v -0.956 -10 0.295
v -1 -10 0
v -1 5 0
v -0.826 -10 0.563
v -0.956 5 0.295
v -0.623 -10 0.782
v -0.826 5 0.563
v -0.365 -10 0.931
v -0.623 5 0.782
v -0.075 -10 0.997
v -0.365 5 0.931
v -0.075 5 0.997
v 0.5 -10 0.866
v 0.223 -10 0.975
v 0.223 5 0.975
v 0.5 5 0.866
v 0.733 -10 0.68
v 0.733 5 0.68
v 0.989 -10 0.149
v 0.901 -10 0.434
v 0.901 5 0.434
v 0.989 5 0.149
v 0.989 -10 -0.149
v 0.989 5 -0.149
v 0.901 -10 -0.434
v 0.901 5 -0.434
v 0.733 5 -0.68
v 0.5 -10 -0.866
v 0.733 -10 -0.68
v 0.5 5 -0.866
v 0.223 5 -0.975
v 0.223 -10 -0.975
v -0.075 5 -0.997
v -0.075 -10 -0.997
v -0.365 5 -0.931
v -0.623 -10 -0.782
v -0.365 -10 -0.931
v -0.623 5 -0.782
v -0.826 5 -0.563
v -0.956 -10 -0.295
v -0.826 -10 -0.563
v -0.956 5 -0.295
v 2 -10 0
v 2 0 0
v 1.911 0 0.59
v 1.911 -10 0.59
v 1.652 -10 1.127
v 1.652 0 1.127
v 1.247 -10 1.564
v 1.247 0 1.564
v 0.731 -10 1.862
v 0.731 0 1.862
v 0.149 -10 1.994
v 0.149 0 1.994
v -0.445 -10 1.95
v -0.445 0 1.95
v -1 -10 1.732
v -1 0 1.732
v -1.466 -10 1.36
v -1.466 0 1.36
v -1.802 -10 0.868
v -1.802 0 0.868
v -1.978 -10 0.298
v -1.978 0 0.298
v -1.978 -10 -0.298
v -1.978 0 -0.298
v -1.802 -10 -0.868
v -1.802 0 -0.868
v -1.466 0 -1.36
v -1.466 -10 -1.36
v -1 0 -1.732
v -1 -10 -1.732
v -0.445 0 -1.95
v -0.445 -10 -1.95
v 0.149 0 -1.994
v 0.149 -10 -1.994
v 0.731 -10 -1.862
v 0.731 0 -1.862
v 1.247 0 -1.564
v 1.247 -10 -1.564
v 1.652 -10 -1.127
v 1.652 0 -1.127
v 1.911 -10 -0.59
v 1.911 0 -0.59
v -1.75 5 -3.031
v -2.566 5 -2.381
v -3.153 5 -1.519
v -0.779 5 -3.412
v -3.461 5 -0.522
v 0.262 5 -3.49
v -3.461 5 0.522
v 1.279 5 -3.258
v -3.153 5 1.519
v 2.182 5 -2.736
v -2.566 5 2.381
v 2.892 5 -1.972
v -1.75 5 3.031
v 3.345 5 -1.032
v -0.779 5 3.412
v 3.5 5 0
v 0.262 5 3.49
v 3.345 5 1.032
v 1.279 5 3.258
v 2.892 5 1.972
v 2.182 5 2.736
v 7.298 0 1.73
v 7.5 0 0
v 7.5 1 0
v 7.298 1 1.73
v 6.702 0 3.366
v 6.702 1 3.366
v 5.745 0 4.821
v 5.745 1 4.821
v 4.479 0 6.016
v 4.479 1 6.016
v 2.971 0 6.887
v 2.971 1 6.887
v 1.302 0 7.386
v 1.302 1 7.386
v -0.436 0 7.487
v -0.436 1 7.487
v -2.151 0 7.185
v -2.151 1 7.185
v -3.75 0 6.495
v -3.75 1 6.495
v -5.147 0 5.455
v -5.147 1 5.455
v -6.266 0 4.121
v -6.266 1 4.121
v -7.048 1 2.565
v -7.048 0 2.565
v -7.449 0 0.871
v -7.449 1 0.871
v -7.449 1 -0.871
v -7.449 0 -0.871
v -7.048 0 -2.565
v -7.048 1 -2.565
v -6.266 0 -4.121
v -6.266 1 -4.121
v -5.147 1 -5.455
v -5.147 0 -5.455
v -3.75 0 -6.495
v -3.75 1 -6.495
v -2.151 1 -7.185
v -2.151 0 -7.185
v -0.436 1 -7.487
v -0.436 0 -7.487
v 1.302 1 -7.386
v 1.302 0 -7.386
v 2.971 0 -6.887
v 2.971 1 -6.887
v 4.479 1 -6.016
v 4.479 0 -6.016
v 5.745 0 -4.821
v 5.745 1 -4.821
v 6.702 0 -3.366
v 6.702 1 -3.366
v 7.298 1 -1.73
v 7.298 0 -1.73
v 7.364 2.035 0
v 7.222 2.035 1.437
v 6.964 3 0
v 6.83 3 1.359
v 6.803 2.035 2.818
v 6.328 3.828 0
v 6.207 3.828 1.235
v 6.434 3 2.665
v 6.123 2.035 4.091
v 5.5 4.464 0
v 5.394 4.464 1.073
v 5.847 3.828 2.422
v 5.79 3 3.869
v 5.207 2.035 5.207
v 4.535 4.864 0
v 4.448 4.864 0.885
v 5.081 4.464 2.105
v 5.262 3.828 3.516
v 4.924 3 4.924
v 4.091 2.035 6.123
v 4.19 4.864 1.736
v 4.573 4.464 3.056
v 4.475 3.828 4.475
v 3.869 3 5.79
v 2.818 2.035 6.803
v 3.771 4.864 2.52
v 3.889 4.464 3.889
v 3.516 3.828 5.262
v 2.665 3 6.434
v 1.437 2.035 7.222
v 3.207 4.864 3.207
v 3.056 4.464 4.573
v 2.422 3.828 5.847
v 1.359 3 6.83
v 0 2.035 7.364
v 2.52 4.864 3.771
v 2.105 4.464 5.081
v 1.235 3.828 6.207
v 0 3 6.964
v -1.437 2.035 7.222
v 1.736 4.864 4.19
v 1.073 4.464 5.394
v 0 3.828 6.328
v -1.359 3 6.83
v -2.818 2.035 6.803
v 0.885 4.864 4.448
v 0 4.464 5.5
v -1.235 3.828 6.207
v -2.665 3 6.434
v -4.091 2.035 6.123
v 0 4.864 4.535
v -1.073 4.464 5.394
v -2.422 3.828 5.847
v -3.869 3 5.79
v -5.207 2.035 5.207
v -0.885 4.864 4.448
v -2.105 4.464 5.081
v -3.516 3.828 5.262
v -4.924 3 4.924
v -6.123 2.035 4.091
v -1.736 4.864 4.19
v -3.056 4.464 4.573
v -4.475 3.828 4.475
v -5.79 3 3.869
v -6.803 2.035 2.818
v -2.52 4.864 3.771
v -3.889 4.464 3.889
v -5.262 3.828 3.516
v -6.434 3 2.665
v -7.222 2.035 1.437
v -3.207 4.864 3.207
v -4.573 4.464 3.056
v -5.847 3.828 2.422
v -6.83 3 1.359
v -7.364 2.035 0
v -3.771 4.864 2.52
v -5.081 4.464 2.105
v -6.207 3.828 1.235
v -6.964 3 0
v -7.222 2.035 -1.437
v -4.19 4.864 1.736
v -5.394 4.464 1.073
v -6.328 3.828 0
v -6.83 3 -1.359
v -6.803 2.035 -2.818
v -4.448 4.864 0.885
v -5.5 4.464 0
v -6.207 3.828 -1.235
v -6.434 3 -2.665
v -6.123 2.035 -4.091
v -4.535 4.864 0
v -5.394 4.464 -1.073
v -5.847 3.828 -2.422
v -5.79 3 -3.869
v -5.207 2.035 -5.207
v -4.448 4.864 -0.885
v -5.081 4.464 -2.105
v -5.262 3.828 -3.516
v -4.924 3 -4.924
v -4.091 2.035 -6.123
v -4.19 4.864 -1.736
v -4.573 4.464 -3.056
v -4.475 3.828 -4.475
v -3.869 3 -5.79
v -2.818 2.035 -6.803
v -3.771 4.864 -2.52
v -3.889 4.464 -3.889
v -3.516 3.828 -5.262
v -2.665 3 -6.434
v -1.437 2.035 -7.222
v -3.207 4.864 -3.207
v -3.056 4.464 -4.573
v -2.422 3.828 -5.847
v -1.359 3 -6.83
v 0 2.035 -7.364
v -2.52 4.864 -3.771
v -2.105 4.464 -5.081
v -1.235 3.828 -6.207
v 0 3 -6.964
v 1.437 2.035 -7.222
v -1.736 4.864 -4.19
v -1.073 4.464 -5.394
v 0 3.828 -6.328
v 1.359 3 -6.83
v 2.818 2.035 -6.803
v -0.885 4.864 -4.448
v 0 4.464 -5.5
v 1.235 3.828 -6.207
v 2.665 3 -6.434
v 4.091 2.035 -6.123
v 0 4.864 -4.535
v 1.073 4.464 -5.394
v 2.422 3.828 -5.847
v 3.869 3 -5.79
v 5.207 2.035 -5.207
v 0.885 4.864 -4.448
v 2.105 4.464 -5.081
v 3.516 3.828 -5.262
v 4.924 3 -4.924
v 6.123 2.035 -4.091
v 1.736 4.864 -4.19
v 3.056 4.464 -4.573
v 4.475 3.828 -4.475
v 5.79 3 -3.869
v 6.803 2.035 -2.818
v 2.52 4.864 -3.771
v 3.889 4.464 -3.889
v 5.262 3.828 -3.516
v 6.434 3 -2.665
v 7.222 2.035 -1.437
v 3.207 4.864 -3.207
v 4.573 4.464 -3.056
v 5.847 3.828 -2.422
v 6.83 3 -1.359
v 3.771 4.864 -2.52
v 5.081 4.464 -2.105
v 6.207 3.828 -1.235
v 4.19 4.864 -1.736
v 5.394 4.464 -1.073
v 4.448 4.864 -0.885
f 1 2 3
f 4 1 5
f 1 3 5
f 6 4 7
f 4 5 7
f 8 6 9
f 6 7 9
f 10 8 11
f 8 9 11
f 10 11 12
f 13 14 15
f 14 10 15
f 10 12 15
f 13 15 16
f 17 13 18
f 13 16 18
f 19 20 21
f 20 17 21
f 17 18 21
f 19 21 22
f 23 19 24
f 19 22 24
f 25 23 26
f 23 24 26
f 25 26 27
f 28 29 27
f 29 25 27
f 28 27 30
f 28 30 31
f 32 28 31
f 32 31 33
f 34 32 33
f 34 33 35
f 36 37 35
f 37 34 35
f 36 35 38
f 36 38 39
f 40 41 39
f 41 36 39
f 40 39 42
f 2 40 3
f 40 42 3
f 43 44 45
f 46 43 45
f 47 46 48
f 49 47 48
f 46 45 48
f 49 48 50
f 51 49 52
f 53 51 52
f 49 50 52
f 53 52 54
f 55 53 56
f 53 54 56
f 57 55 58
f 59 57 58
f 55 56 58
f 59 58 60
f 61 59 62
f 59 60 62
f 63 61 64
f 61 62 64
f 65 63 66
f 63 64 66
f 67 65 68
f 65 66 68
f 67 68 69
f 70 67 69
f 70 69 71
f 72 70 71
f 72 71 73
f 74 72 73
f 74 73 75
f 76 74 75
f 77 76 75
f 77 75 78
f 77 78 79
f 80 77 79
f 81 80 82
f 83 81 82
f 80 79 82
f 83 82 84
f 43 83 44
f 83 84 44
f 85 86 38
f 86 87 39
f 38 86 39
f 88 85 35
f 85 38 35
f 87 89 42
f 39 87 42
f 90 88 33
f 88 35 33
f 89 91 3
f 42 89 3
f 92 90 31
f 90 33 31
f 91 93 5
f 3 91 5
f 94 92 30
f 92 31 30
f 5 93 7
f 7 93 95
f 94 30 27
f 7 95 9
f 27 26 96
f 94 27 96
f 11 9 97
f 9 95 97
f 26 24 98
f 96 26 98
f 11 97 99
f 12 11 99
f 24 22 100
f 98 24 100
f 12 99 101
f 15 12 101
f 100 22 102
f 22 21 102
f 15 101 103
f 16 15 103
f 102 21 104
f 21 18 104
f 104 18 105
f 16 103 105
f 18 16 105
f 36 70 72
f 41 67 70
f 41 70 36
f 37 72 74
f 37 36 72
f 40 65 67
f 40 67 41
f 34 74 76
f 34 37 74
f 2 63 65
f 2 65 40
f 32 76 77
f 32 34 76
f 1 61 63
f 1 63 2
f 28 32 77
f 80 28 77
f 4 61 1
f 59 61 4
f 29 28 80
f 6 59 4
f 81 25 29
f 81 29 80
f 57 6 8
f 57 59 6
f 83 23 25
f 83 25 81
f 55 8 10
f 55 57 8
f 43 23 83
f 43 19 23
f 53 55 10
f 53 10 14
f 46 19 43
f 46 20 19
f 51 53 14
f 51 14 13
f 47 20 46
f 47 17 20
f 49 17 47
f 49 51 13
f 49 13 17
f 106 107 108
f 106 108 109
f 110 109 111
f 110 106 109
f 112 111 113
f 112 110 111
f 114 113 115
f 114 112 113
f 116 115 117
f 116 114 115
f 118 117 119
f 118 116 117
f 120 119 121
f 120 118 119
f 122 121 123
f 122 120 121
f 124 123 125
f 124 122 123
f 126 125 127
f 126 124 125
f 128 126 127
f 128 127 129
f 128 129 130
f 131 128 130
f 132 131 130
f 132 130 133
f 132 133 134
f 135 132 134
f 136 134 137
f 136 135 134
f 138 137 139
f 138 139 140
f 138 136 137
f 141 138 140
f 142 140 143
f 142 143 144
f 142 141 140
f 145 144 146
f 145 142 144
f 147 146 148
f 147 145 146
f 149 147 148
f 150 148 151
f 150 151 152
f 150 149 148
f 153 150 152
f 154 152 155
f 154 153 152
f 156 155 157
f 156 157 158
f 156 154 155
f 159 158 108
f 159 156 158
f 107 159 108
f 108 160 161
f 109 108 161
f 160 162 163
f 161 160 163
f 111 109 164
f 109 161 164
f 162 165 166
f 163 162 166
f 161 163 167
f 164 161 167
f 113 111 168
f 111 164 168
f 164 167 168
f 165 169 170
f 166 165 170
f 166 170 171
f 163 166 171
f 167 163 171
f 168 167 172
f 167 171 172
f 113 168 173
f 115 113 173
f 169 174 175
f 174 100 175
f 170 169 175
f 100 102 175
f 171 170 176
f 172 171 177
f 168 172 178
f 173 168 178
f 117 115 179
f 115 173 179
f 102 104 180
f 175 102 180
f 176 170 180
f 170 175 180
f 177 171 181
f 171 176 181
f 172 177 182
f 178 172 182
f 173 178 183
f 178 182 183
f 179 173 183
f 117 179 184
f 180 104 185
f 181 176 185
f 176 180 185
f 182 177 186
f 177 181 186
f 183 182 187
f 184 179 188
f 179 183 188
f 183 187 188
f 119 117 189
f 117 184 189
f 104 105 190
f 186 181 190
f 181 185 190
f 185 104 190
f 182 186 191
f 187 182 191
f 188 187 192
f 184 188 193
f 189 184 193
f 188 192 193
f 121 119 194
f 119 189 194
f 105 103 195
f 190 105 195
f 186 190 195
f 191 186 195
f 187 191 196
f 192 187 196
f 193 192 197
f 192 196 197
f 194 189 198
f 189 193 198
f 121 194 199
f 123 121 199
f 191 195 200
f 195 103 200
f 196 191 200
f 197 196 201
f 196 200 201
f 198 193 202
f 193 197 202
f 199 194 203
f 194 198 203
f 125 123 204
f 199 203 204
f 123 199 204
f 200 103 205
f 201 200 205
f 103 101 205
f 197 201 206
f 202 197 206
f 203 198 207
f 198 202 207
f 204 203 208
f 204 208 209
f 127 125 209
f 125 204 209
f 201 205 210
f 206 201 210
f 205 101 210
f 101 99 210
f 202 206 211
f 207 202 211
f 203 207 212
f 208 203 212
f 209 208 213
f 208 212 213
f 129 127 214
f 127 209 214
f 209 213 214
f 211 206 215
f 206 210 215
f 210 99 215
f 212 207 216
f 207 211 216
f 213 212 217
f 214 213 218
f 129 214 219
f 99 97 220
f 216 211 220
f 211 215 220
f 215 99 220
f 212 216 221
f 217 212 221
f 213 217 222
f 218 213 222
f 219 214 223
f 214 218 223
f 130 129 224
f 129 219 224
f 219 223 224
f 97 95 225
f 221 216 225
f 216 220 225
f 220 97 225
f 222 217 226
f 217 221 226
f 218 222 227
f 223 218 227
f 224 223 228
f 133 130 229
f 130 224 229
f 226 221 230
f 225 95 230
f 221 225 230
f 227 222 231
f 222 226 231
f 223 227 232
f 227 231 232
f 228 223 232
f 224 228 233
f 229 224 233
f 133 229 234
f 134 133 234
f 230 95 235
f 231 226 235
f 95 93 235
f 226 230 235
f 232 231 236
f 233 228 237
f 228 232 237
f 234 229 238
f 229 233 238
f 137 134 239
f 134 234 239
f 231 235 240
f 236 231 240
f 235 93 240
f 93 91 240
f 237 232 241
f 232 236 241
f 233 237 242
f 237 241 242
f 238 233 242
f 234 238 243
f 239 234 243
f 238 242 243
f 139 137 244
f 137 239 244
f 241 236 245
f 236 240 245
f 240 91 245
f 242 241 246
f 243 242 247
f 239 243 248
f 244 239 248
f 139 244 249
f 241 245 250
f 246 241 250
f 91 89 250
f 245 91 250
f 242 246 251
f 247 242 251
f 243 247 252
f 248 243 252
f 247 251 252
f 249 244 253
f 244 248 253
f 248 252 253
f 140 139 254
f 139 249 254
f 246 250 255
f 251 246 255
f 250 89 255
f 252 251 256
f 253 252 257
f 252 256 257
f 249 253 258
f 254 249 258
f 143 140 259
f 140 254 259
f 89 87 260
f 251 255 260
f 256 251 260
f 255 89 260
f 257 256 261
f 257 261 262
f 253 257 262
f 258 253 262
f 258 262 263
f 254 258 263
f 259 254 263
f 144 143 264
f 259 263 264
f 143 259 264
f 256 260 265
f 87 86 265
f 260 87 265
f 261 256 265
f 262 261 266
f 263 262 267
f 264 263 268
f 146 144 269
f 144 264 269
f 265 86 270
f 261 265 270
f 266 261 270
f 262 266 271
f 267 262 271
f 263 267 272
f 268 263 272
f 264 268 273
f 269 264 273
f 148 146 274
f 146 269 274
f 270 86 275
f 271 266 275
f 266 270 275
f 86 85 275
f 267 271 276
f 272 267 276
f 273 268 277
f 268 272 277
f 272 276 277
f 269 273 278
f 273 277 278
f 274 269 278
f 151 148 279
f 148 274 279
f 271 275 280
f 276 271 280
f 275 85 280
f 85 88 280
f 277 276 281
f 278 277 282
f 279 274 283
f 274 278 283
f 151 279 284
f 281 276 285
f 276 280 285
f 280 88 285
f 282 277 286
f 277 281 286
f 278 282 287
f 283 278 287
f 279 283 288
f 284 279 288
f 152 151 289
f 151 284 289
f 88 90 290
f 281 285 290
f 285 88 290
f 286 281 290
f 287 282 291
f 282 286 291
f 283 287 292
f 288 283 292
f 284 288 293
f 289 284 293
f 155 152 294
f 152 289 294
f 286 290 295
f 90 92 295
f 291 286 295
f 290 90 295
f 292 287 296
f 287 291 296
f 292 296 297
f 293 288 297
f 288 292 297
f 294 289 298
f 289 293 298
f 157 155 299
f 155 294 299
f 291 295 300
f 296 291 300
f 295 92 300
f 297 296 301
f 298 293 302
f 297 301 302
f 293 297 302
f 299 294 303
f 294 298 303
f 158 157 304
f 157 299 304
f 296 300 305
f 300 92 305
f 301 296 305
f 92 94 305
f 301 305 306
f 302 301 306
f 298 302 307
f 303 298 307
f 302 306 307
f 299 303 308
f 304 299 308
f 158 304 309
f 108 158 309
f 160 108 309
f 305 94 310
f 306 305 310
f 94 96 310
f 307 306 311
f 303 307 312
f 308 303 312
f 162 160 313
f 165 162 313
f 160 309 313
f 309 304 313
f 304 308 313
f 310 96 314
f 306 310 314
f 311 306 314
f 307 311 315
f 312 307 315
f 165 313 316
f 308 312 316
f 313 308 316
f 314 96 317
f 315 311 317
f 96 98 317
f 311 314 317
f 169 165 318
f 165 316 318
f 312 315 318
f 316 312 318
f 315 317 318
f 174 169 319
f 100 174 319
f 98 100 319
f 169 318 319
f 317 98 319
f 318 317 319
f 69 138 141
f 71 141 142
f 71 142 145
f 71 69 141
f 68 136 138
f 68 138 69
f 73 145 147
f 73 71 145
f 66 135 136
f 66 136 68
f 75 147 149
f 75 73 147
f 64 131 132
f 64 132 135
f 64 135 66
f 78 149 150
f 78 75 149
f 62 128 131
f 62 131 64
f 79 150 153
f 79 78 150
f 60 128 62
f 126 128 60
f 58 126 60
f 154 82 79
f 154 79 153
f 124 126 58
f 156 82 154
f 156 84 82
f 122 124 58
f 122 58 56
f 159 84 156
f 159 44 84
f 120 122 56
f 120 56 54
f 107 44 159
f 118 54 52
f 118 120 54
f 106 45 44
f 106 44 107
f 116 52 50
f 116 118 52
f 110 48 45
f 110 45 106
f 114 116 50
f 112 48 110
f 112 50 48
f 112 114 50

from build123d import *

# Parameters (mm, degrees)
F0_R     = 2
F0_R_2   = 1
F1_DEPTH = 10
F2_R     = 7.5
F3_DEPTH = 5
F4_R     = 1
F5_DEPTH = 15.001
F6_R     = 4


with BuildPart() as f1:
    # F0 (on Front) → F1 (new body)
    with BuildSketch(Plane.XZ):
        Circle(F0_R)
        Circle(F0_R_2, mode=Mode.SUBTRACT)
    extrude(amount=F1_DEPTH)

    # F2 (on Front) → F3 (join)
    with BuildSketch(Plane.XZ):
        Circle(F2_R)
    extrude(amount=-F3_DEPTH)

    # F4 (on face) → F5 (cut, through all)
    with BuildSketch(Plane(origin=(0, 5, 0), x_dir=(-1, 0, 0), z_dir=(0, 1, 0))):
        Circle(F4_R)
    extrude(amount=-F5_DEPTH, mode=Mode.SUBTRACT)

    # F6
    f6_edges = [f1.edges().sort_by_distance(p)[0] for p in [
        (-7.5, 5, 0),
    ]]
    fillet(f6_edges, radius=F6_R)


solid = f1.part
